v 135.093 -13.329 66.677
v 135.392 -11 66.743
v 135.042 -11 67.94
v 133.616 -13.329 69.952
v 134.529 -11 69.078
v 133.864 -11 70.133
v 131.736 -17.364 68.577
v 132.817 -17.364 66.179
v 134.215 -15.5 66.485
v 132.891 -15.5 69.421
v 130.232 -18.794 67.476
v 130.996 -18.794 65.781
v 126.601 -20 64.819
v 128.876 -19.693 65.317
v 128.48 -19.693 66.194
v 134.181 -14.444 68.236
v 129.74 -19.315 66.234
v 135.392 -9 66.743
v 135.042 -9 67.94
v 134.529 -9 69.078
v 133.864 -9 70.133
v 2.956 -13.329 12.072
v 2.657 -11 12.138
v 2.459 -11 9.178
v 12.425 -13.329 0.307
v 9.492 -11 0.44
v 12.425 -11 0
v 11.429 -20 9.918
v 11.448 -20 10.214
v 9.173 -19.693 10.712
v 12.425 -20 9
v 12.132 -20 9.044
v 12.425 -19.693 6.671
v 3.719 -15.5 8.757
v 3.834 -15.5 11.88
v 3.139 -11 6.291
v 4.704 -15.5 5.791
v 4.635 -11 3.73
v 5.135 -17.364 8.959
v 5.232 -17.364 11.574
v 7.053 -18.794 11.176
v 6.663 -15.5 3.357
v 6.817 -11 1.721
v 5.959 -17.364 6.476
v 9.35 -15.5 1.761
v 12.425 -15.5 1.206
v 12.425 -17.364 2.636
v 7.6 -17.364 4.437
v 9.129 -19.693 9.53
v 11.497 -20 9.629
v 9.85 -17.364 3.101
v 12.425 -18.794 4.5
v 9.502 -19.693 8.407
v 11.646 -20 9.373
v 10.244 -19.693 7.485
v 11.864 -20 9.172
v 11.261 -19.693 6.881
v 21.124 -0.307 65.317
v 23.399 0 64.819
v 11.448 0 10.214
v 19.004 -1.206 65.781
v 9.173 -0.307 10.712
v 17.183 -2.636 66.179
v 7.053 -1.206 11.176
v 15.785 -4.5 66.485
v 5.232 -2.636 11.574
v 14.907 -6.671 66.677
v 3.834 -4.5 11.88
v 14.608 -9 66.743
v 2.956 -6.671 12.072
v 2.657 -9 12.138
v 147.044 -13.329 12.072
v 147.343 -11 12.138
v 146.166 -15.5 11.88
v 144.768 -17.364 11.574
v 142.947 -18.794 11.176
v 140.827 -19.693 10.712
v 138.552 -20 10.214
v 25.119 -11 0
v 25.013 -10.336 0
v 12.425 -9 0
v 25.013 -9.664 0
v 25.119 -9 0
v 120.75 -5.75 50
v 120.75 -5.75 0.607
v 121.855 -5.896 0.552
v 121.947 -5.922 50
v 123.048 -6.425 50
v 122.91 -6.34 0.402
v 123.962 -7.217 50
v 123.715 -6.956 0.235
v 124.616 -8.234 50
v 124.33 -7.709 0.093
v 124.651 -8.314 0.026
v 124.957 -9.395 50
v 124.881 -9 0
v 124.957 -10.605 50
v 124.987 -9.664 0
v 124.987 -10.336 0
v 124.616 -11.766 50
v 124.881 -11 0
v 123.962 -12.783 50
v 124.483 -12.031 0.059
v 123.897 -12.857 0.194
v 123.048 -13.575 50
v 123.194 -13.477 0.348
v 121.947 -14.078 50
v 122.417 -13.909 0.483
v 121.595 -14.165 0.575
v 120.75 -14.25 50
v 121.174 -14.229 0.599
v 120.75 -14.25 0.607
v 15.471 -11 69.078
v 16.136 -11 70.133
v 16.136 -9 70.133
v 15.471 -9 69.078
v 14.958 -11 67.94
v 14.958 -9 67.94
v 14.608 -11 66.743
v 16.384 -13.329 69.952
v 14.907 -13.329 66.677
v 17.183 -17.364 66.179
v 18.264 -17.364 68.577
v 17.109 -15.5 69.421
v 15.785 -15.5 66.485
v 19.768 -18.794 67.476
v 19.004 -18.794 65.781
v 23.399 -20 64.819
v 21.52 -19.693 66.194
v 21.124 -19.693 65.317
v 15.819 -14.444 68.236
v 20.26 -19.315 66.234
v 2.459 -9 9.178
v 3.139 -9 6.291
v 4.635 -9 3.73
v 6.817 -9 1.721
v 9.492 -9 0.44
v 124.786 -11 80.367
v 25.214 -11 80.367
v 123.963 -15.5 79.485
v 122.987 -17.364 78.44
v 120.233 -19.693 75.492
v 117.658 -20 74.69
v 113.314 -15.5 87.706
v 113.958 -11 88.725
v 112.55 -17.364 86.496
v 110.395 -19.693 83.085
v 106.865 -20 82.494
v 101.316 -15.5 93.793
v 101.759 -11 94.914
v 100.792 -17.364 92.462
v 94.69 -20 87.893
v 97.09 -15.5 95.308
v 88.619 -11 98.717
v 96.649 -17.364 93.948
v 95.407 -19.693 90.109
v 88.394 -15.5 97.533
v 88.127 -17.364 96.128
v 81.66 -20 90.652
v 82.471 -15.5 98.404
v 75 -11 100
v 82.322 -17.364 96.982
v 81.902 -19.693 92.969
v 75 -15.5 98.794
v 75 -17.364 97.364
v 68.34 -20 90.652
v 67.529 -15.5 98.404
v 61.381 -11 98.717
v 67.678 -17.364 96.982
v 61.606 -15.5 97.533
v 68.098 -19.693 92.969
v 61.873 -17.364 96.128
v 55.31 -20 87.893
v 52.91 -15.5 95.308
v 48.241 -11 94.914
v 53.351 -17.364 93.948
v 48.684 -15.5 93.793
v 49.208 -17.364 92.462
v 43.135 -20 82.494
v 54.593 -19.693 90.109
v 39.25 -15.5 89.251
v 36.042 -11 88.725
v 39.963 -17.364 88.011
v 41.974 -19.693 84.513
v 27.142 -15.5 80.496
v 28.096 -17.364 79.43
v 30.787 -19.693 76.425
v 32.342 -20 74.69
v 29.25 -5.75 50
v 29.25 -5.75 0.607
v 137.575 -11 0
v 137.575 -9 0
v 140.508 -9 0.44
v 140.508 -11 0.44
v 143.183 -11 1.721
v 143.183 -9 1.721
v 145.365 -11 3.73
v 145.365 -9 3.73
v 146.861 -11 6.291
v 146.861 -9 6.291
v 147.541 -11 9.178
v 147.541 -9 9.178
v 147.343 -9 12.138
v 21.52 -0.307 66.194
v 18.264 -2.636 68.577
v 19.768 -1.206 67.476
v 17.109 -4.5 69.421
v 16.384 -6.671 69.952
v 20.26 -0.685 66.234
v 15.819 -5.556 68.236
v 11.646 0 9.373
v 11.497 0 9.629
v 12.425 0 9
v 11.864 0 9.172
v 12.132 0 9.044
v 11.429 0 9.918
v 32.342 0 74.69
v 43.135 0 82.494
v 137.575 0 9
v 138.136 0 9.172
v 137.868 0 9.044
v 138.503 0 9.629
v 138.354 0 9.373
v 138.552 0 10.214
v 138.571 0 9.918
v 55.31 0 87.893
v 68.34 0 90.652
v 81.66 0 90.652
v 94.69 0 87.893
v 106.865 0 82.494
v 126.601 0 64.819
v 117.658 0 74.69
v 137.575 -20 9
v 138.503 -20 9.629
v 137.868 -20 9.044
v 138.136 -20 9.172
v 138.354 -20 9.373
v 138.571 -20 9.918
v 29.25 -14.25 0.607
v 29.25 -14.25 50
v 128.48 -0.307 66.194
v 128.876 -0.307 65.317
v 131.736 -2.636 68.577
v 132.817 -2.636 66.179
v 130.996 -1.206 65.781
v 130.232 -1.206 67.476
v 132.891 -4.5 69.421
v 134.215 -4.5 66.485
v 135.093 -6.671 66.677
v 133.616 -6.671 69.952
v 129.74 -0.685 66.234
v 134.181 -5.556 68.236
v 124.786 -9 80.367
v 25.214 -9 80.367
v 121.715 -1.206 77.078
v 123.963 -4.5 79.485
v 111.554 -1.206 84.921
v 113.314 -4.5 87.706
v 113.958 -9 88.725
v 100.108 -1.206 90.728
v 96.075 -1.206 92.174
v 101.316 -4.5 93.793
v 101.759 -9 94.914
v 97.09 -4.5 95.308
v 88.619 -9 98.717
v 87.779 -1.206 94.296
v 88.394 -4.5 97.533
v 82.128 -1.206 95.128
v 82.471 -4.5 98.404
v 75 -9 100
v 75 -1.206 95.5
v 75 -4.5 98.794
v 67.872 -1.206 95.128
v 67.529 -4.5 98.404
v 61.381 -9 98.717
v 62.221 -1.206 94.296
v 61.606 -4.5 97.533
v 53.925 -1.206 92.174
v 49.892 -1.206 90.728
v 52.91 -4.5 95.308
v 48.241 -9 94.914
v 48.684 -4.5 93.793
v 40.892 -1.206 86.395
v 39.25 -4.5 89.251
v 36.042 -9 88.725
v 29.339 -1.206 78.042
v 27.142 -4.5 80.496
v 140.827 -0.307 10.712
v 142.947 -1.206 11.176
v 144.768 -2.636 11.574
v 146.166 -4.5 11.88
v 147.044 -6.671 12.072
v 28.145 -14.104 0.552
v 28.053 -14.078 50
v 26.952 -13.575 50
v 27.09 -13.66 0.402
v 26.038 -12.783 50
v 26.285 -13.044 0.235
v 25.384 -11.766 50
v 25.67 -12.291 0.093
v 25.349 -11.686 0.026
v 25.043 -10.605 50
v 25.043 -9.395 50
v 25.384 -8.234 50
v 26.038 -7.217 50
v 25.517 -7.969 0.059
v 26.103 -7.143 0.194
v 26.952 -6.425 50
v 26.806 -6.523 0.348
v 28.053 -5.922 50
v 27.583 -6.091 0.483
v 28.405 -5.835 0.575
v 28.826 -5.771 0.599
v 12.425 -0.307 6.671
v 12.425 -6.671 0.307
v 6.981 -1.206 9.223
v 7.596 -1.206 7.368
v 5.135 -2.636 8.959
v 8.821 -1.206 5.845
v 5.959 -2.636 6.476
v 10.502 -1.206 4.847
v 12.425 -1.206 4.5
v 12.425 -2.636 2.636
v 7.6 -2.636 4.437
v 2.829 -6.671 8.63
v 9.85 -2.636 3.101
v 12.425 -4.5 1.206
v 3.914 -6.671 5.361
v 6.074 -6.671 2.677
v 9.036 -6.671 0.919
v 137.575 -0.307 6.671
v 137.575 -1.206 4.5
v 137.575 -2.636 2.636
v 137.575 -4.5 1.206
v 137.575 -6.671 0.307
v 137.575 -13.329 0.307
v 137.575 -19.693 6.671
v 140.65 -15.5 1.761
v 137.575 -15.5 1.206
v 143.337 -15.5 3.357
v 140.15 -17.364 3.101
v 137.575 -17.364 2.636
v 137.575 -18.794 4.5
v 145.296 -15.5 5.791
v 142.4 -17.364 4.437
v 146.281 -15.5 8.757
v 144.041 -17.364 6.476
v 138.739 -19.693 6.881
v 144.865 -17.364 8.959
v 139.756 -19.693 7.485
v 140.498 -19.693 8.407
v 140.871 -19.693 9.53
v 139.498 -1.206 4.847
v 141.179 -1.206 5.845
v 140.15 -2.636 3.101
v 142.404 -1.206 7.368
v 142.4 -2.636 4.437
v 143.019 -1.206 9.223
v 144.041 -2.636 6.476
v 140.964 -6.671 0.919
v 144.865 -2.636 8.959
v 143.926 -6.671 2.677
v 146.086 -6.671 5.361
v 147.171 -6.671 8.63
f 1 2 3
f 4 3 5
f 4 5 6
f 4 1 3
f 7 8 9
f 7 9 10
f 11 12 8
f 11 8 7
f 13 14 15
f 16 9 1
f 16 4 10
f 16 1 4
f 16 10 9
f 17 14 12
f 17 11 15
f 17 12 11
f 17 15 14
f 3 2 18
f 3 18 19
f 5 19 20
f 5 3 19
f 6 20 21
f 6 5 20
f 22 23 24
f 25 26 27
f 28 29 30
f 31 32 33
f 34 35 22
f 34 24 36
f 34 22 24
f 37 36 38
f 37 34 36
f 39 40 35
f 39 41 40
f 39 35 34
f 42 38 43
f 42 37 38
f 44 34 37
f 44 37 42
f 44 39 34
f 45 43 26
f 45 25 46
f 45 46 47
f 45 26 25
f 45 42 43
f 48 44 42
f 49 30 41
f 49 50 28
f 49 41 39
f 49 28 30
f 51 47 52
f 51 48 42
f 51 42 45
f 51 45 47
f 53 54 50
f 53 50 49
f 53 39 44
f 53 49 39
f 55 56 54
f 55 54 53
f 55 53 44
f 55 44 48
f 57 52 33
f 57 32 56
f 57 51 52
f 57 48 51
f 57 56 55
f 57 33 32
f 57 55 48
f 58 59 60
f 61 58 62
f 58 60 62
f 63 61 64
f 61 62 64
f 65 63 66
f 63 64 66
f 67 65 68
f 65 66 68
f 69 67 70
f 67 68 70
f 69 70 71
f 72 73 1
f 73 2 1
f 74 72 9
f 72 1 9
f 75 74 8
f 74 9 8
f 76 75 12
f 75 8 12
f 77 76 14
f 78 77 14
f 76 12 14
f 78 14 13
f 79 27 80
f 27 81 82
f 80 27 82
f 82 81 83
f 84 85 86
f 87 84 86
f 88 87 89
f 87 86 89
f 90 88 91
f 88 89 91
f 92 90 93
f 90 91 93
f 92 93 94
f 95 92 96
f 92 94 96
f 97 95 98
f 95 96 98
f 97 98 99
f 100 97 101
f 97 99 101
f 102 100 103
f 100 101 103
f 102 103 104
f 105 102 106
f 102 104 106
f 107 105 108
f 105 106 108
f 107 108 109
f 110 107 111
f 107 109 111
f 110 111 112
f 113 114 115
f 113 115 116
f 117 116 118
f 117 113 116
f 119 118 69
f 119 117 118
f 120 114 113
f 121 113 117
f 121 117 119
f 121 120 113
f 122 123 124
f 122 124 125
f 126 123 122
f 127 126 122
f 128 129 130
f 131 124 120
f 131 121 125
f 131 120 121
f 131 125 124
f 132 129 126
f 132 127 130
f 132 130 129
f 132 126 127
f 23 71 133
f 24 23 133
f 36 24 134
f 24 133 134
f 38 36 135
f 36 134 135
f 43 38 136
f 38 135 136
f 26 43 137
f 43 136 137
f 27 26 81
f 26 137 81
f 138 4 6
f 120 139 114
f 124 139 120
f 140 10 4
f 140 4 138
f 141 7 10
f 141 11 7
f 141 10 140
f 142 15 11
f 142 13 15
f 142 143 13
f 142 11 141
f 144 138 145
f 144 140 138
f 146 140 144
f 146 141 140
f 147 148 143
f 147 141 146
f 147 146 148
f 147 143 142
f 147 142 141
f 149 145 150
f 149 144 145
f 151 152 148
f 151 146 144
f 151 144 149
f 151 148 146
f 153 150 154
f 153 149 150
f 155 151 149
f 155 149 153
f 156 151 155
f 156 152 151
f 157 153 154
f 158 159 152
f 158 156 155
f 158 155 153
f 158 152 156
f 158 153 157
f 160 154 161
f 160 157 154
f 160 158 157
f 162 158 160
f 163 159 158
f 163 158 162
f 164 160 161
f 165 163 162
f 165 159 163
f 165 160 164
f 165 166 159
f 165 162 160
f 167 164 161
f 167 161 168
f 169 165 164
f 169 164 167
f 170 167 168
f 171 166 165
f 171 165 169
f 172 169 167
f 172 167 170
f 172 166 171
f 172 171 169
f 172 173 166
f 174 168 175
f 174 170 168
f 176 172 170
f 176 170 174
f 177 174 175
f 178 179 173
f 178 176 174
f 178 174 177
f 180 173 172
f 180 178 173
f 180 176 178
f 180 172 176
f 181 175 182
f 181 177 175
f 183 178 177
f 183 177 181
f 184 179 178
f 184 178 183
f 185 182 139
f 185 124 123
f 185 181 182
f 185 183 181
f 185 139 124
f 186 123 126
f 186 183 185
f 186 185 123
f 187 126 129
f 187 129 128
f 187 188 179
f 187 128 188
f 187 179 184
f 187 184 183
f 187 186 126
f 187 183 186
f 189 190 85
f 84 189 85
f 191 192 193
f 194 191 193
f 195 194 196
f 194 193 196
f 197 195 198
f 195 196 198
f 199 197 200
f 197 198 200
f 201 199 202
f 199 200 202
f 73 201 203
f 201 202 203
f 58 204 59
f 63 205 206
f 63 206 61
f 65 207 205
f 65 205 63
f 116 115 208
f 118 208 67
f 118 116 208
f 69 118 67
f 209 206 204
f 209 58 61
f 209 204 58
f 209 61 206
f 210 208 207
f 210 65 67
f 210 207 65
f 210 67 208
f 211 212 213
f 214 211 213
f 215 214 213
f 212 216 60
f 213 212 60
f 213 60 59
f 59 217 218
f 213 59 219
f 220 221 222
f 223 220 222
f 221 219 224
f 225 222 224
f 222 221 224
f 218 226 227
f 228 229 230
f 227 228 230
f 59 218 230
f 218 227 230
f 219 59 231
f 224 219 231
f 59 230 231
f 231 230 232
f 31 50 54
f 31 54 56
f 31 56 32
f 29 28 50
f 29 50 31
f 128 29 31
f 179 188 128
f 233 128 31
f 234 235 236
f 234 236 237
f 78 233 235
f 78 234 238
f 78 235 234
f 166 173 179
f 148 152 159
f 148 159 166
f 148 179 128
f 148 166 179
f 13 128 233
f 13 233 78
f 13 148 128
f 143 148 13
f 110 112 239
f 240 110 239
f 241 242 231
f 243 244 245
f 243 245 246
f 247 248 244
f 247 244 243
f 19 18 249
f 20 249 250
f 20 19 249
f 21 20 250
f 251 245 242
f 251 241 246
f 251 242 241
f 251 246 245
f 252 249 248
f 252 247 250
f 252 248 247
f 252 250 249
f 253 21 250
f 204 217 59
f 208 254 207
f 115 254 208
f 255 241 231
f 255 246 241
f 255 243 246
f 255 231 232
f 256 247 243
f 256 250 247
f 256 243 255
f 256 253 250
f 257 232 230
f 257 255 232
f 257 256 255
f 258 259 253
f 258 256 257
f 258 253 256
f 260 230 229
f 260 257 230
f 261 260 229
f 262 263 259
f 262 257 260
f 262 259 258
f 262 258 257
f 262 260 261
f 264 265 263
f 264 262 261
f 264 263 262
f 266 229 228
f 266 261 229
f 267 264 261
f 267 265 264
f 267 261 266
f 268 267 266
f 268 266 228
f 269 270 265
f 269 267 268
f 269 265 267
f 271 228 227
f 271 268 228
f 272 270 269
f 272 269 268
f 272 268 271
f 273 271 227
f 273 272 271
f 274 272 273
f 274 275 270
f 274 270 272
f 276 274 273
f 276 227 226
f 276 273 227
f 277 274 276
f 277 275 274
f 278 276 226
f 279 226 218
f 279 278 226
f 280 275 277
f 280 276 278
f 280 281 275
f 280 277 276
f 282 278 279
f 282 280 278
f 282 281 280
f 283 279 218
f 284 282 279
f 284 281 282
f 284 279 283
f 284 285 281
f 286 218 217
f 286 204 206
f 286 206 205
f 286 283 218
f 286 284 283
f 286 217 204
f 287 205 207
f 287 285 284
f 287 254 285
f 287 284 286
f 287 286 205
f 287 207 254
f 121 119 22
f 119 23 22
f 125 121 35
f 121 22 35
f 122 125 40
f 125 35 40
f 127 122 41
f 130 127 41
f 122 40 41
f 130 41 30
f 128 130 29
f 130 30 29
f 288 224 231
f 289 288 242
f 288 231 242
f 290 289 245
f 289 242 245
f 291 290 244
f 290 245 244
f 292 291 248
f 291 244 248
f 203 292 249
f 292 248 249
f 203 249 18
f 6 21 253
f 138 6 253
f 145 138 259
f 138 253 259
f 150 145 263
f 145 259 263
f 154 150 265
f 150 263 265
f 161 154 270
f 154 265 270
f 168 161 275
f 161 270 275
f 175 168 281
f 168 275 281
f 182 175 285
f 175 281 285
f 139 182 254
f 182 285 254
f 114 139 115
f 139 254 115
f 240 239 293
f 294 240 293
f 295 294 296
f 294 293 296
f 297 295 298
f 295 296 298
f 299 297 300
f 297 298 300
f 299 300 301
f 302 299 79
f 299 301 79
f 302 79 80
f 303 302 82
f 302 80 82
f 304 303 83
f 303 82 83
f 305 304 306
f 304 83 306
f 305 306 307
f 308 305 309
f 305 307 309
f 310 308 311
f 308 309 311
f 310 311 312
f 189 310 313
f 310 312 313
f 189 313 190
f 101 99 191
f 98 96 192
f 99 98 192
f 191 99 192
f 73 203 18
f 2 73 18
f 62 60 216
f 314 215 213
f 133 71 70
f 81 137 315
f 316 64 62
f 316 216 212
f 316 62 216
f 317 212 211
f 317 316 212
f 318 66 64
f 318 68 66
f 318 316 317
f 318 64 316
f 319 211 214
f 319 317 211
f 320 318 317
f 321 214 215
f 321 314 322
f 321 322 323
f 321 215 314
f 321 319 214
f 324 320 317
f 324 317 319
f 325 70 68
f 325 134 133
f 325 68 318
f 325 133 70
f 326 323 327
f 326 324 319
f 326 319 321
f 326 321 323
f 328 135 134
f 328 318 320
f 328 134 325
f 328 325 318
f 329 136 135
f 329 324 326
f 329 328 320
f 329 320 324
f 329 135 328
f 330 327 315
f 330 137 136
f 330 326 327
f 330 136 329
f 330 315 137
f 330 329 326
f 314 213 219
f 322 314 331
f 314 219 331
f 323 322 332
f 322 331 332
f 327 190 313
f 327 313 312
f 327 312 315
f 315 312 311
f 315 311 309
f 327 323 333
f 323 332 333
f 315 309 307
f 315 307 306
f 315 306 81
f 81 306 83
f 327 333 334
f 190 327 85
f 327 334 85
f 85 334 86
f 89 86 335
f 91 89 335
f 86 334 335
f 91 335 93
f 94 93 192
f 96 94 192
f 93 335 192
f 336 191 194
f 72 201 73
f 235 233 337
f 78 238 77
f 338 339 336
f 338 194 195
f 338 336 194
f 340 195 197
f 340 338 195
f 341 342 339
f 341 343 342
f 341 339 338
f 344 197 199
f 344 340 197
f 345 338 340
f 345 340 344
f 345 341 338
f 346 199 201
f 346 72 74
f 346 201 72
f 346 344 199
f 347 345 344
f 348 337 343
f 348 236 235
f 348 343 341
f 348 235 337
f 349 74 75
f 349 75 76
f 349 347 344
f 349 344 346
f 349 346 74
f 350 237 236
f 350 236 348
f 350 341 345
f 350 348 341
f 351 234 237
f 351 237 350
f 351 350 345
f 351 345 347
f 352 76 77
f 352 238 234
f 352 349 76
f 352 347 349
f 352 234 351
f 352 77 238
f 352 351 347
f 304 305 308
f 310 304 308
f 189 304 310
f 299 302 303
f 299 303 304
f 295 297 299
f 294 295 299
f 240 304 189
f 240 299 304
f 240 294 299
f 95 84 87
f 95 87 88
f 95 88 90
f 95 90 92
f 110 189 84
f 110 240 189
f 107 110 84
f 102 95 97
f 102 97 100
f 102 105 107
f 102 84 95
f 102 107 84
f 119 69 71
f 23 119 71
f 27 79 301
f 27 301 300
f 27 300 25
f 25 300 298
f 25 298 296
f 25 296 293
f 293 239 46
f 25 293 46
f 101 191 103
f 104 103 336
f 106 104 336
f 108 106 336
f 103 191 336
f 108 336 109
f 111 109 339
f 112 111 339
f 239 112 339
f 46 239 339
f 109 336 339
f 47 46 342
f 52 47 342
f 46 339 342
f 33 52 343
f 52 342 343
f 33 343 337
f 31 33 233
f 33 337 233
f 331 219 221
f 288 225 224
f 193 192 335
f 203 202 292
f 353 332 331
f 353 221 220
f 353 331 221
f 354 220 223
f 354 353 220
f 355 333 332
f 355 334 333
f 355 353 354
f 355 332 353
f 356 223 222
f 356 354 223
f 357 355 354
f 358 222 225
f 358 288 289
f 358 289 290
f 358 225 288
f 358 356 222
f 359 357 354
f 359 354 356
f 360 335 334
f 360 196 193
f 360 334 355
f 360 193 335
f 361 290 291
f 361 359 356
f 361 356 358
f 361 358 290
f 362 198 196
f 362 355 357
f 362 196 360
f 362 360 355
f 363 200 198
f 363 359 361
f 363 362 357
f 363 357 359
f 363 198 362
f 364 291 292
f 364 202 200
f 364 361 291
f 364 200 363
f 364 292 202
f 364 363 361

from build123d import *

# Parameters (mm, degrees)
F1_DEPTH = 20
F2_F1_R  = 9
F2_F2_R  = 9
F2_F3_R  = 9
F2_F4_R  = 9
F4_DEPTH = 50


# Not quite as in the source:
# - a feature names something its author has since deleted; it is built from what else it names


with BuildPart() as f1:
    # F0 (on Front) → F1 (new body)
    with BuildSketch(Plane.XZ):
        with BuildLine():
            ThreePointArc((2.6565660371, 12.138023602), (4.6349491554, 3.7302406753), (12.4253354109, 0))
            Line((12.4253354109, 0), (137.5746645891, 0))
            ThreePointArc((137.5746645891, 0), (145.3650508446, 3.7302406753), (147.3434339629, 12.138023602))
            Line((147.3434339629, 12.138023602), (135, 68.5359789614))
            ThreePointArc((135, 68.5359789614), (75, 100), (15, 68.5359789614))
            Line((15, 68.5359789614), (2.6565660371, 12.138023602))
        make_face()
    extrude(amount=F1_DEPTH)

    # F2: fillet of radius 9 on 13 edges, made by hand

    # F2_f1
    f2_f1_edges = [f1.edges().sort_by_distance(p)[0] for p in [
        (135, -10, 68.5359789614),
    ]]
    fillet(f2_f1_edges, radius=F2_F1_R)

    # F2_f2
    f2_f2_edges = [f1.edges().sort_by_distance(p)[0] for p in [
        (15, -10, 68.5359789614),
    ]]
    fillet(f2_f2_edges, radius=F2_F2_R)

    # F2_f3
    f2_f3_edges = [f1.edges().sort_by_distance(p)[0] for p in [
        (75, 0, 100),
    ]]
    fillet(f2_f3_edges, radius=F2_F3_R)

    # F2_f4
    f2_f4_edges = [f1.edges().sort_by_distance(p)[0] for p in [
        (75, -20, 100),
    ]]
    fillet(f2_f4_edges, radius=F2_F4_R)

    # F3 (on face) → F4 (cut)
    with BuildSketch(Plane(origin=(0, 0, 0), x_dir=(1, 0, 0), z_dir=(0, 0, -1))):
        with BuildLine():
            Line((29.25, 5.75), (120.75, 5.75))
            ThreePointArc((120.75, 5.75), (125, 10), (120.75, 14.25))
            Line((120.75, 14.25), (29.25, 14.25))
            ThreePointArc((29.25, 14.25), (25, 10), (29.25, 5.75))
        make_face()
    extrude(amount=-F4_DEPTH, mode=Mode.SUBTRACT)


solid = f1.part
